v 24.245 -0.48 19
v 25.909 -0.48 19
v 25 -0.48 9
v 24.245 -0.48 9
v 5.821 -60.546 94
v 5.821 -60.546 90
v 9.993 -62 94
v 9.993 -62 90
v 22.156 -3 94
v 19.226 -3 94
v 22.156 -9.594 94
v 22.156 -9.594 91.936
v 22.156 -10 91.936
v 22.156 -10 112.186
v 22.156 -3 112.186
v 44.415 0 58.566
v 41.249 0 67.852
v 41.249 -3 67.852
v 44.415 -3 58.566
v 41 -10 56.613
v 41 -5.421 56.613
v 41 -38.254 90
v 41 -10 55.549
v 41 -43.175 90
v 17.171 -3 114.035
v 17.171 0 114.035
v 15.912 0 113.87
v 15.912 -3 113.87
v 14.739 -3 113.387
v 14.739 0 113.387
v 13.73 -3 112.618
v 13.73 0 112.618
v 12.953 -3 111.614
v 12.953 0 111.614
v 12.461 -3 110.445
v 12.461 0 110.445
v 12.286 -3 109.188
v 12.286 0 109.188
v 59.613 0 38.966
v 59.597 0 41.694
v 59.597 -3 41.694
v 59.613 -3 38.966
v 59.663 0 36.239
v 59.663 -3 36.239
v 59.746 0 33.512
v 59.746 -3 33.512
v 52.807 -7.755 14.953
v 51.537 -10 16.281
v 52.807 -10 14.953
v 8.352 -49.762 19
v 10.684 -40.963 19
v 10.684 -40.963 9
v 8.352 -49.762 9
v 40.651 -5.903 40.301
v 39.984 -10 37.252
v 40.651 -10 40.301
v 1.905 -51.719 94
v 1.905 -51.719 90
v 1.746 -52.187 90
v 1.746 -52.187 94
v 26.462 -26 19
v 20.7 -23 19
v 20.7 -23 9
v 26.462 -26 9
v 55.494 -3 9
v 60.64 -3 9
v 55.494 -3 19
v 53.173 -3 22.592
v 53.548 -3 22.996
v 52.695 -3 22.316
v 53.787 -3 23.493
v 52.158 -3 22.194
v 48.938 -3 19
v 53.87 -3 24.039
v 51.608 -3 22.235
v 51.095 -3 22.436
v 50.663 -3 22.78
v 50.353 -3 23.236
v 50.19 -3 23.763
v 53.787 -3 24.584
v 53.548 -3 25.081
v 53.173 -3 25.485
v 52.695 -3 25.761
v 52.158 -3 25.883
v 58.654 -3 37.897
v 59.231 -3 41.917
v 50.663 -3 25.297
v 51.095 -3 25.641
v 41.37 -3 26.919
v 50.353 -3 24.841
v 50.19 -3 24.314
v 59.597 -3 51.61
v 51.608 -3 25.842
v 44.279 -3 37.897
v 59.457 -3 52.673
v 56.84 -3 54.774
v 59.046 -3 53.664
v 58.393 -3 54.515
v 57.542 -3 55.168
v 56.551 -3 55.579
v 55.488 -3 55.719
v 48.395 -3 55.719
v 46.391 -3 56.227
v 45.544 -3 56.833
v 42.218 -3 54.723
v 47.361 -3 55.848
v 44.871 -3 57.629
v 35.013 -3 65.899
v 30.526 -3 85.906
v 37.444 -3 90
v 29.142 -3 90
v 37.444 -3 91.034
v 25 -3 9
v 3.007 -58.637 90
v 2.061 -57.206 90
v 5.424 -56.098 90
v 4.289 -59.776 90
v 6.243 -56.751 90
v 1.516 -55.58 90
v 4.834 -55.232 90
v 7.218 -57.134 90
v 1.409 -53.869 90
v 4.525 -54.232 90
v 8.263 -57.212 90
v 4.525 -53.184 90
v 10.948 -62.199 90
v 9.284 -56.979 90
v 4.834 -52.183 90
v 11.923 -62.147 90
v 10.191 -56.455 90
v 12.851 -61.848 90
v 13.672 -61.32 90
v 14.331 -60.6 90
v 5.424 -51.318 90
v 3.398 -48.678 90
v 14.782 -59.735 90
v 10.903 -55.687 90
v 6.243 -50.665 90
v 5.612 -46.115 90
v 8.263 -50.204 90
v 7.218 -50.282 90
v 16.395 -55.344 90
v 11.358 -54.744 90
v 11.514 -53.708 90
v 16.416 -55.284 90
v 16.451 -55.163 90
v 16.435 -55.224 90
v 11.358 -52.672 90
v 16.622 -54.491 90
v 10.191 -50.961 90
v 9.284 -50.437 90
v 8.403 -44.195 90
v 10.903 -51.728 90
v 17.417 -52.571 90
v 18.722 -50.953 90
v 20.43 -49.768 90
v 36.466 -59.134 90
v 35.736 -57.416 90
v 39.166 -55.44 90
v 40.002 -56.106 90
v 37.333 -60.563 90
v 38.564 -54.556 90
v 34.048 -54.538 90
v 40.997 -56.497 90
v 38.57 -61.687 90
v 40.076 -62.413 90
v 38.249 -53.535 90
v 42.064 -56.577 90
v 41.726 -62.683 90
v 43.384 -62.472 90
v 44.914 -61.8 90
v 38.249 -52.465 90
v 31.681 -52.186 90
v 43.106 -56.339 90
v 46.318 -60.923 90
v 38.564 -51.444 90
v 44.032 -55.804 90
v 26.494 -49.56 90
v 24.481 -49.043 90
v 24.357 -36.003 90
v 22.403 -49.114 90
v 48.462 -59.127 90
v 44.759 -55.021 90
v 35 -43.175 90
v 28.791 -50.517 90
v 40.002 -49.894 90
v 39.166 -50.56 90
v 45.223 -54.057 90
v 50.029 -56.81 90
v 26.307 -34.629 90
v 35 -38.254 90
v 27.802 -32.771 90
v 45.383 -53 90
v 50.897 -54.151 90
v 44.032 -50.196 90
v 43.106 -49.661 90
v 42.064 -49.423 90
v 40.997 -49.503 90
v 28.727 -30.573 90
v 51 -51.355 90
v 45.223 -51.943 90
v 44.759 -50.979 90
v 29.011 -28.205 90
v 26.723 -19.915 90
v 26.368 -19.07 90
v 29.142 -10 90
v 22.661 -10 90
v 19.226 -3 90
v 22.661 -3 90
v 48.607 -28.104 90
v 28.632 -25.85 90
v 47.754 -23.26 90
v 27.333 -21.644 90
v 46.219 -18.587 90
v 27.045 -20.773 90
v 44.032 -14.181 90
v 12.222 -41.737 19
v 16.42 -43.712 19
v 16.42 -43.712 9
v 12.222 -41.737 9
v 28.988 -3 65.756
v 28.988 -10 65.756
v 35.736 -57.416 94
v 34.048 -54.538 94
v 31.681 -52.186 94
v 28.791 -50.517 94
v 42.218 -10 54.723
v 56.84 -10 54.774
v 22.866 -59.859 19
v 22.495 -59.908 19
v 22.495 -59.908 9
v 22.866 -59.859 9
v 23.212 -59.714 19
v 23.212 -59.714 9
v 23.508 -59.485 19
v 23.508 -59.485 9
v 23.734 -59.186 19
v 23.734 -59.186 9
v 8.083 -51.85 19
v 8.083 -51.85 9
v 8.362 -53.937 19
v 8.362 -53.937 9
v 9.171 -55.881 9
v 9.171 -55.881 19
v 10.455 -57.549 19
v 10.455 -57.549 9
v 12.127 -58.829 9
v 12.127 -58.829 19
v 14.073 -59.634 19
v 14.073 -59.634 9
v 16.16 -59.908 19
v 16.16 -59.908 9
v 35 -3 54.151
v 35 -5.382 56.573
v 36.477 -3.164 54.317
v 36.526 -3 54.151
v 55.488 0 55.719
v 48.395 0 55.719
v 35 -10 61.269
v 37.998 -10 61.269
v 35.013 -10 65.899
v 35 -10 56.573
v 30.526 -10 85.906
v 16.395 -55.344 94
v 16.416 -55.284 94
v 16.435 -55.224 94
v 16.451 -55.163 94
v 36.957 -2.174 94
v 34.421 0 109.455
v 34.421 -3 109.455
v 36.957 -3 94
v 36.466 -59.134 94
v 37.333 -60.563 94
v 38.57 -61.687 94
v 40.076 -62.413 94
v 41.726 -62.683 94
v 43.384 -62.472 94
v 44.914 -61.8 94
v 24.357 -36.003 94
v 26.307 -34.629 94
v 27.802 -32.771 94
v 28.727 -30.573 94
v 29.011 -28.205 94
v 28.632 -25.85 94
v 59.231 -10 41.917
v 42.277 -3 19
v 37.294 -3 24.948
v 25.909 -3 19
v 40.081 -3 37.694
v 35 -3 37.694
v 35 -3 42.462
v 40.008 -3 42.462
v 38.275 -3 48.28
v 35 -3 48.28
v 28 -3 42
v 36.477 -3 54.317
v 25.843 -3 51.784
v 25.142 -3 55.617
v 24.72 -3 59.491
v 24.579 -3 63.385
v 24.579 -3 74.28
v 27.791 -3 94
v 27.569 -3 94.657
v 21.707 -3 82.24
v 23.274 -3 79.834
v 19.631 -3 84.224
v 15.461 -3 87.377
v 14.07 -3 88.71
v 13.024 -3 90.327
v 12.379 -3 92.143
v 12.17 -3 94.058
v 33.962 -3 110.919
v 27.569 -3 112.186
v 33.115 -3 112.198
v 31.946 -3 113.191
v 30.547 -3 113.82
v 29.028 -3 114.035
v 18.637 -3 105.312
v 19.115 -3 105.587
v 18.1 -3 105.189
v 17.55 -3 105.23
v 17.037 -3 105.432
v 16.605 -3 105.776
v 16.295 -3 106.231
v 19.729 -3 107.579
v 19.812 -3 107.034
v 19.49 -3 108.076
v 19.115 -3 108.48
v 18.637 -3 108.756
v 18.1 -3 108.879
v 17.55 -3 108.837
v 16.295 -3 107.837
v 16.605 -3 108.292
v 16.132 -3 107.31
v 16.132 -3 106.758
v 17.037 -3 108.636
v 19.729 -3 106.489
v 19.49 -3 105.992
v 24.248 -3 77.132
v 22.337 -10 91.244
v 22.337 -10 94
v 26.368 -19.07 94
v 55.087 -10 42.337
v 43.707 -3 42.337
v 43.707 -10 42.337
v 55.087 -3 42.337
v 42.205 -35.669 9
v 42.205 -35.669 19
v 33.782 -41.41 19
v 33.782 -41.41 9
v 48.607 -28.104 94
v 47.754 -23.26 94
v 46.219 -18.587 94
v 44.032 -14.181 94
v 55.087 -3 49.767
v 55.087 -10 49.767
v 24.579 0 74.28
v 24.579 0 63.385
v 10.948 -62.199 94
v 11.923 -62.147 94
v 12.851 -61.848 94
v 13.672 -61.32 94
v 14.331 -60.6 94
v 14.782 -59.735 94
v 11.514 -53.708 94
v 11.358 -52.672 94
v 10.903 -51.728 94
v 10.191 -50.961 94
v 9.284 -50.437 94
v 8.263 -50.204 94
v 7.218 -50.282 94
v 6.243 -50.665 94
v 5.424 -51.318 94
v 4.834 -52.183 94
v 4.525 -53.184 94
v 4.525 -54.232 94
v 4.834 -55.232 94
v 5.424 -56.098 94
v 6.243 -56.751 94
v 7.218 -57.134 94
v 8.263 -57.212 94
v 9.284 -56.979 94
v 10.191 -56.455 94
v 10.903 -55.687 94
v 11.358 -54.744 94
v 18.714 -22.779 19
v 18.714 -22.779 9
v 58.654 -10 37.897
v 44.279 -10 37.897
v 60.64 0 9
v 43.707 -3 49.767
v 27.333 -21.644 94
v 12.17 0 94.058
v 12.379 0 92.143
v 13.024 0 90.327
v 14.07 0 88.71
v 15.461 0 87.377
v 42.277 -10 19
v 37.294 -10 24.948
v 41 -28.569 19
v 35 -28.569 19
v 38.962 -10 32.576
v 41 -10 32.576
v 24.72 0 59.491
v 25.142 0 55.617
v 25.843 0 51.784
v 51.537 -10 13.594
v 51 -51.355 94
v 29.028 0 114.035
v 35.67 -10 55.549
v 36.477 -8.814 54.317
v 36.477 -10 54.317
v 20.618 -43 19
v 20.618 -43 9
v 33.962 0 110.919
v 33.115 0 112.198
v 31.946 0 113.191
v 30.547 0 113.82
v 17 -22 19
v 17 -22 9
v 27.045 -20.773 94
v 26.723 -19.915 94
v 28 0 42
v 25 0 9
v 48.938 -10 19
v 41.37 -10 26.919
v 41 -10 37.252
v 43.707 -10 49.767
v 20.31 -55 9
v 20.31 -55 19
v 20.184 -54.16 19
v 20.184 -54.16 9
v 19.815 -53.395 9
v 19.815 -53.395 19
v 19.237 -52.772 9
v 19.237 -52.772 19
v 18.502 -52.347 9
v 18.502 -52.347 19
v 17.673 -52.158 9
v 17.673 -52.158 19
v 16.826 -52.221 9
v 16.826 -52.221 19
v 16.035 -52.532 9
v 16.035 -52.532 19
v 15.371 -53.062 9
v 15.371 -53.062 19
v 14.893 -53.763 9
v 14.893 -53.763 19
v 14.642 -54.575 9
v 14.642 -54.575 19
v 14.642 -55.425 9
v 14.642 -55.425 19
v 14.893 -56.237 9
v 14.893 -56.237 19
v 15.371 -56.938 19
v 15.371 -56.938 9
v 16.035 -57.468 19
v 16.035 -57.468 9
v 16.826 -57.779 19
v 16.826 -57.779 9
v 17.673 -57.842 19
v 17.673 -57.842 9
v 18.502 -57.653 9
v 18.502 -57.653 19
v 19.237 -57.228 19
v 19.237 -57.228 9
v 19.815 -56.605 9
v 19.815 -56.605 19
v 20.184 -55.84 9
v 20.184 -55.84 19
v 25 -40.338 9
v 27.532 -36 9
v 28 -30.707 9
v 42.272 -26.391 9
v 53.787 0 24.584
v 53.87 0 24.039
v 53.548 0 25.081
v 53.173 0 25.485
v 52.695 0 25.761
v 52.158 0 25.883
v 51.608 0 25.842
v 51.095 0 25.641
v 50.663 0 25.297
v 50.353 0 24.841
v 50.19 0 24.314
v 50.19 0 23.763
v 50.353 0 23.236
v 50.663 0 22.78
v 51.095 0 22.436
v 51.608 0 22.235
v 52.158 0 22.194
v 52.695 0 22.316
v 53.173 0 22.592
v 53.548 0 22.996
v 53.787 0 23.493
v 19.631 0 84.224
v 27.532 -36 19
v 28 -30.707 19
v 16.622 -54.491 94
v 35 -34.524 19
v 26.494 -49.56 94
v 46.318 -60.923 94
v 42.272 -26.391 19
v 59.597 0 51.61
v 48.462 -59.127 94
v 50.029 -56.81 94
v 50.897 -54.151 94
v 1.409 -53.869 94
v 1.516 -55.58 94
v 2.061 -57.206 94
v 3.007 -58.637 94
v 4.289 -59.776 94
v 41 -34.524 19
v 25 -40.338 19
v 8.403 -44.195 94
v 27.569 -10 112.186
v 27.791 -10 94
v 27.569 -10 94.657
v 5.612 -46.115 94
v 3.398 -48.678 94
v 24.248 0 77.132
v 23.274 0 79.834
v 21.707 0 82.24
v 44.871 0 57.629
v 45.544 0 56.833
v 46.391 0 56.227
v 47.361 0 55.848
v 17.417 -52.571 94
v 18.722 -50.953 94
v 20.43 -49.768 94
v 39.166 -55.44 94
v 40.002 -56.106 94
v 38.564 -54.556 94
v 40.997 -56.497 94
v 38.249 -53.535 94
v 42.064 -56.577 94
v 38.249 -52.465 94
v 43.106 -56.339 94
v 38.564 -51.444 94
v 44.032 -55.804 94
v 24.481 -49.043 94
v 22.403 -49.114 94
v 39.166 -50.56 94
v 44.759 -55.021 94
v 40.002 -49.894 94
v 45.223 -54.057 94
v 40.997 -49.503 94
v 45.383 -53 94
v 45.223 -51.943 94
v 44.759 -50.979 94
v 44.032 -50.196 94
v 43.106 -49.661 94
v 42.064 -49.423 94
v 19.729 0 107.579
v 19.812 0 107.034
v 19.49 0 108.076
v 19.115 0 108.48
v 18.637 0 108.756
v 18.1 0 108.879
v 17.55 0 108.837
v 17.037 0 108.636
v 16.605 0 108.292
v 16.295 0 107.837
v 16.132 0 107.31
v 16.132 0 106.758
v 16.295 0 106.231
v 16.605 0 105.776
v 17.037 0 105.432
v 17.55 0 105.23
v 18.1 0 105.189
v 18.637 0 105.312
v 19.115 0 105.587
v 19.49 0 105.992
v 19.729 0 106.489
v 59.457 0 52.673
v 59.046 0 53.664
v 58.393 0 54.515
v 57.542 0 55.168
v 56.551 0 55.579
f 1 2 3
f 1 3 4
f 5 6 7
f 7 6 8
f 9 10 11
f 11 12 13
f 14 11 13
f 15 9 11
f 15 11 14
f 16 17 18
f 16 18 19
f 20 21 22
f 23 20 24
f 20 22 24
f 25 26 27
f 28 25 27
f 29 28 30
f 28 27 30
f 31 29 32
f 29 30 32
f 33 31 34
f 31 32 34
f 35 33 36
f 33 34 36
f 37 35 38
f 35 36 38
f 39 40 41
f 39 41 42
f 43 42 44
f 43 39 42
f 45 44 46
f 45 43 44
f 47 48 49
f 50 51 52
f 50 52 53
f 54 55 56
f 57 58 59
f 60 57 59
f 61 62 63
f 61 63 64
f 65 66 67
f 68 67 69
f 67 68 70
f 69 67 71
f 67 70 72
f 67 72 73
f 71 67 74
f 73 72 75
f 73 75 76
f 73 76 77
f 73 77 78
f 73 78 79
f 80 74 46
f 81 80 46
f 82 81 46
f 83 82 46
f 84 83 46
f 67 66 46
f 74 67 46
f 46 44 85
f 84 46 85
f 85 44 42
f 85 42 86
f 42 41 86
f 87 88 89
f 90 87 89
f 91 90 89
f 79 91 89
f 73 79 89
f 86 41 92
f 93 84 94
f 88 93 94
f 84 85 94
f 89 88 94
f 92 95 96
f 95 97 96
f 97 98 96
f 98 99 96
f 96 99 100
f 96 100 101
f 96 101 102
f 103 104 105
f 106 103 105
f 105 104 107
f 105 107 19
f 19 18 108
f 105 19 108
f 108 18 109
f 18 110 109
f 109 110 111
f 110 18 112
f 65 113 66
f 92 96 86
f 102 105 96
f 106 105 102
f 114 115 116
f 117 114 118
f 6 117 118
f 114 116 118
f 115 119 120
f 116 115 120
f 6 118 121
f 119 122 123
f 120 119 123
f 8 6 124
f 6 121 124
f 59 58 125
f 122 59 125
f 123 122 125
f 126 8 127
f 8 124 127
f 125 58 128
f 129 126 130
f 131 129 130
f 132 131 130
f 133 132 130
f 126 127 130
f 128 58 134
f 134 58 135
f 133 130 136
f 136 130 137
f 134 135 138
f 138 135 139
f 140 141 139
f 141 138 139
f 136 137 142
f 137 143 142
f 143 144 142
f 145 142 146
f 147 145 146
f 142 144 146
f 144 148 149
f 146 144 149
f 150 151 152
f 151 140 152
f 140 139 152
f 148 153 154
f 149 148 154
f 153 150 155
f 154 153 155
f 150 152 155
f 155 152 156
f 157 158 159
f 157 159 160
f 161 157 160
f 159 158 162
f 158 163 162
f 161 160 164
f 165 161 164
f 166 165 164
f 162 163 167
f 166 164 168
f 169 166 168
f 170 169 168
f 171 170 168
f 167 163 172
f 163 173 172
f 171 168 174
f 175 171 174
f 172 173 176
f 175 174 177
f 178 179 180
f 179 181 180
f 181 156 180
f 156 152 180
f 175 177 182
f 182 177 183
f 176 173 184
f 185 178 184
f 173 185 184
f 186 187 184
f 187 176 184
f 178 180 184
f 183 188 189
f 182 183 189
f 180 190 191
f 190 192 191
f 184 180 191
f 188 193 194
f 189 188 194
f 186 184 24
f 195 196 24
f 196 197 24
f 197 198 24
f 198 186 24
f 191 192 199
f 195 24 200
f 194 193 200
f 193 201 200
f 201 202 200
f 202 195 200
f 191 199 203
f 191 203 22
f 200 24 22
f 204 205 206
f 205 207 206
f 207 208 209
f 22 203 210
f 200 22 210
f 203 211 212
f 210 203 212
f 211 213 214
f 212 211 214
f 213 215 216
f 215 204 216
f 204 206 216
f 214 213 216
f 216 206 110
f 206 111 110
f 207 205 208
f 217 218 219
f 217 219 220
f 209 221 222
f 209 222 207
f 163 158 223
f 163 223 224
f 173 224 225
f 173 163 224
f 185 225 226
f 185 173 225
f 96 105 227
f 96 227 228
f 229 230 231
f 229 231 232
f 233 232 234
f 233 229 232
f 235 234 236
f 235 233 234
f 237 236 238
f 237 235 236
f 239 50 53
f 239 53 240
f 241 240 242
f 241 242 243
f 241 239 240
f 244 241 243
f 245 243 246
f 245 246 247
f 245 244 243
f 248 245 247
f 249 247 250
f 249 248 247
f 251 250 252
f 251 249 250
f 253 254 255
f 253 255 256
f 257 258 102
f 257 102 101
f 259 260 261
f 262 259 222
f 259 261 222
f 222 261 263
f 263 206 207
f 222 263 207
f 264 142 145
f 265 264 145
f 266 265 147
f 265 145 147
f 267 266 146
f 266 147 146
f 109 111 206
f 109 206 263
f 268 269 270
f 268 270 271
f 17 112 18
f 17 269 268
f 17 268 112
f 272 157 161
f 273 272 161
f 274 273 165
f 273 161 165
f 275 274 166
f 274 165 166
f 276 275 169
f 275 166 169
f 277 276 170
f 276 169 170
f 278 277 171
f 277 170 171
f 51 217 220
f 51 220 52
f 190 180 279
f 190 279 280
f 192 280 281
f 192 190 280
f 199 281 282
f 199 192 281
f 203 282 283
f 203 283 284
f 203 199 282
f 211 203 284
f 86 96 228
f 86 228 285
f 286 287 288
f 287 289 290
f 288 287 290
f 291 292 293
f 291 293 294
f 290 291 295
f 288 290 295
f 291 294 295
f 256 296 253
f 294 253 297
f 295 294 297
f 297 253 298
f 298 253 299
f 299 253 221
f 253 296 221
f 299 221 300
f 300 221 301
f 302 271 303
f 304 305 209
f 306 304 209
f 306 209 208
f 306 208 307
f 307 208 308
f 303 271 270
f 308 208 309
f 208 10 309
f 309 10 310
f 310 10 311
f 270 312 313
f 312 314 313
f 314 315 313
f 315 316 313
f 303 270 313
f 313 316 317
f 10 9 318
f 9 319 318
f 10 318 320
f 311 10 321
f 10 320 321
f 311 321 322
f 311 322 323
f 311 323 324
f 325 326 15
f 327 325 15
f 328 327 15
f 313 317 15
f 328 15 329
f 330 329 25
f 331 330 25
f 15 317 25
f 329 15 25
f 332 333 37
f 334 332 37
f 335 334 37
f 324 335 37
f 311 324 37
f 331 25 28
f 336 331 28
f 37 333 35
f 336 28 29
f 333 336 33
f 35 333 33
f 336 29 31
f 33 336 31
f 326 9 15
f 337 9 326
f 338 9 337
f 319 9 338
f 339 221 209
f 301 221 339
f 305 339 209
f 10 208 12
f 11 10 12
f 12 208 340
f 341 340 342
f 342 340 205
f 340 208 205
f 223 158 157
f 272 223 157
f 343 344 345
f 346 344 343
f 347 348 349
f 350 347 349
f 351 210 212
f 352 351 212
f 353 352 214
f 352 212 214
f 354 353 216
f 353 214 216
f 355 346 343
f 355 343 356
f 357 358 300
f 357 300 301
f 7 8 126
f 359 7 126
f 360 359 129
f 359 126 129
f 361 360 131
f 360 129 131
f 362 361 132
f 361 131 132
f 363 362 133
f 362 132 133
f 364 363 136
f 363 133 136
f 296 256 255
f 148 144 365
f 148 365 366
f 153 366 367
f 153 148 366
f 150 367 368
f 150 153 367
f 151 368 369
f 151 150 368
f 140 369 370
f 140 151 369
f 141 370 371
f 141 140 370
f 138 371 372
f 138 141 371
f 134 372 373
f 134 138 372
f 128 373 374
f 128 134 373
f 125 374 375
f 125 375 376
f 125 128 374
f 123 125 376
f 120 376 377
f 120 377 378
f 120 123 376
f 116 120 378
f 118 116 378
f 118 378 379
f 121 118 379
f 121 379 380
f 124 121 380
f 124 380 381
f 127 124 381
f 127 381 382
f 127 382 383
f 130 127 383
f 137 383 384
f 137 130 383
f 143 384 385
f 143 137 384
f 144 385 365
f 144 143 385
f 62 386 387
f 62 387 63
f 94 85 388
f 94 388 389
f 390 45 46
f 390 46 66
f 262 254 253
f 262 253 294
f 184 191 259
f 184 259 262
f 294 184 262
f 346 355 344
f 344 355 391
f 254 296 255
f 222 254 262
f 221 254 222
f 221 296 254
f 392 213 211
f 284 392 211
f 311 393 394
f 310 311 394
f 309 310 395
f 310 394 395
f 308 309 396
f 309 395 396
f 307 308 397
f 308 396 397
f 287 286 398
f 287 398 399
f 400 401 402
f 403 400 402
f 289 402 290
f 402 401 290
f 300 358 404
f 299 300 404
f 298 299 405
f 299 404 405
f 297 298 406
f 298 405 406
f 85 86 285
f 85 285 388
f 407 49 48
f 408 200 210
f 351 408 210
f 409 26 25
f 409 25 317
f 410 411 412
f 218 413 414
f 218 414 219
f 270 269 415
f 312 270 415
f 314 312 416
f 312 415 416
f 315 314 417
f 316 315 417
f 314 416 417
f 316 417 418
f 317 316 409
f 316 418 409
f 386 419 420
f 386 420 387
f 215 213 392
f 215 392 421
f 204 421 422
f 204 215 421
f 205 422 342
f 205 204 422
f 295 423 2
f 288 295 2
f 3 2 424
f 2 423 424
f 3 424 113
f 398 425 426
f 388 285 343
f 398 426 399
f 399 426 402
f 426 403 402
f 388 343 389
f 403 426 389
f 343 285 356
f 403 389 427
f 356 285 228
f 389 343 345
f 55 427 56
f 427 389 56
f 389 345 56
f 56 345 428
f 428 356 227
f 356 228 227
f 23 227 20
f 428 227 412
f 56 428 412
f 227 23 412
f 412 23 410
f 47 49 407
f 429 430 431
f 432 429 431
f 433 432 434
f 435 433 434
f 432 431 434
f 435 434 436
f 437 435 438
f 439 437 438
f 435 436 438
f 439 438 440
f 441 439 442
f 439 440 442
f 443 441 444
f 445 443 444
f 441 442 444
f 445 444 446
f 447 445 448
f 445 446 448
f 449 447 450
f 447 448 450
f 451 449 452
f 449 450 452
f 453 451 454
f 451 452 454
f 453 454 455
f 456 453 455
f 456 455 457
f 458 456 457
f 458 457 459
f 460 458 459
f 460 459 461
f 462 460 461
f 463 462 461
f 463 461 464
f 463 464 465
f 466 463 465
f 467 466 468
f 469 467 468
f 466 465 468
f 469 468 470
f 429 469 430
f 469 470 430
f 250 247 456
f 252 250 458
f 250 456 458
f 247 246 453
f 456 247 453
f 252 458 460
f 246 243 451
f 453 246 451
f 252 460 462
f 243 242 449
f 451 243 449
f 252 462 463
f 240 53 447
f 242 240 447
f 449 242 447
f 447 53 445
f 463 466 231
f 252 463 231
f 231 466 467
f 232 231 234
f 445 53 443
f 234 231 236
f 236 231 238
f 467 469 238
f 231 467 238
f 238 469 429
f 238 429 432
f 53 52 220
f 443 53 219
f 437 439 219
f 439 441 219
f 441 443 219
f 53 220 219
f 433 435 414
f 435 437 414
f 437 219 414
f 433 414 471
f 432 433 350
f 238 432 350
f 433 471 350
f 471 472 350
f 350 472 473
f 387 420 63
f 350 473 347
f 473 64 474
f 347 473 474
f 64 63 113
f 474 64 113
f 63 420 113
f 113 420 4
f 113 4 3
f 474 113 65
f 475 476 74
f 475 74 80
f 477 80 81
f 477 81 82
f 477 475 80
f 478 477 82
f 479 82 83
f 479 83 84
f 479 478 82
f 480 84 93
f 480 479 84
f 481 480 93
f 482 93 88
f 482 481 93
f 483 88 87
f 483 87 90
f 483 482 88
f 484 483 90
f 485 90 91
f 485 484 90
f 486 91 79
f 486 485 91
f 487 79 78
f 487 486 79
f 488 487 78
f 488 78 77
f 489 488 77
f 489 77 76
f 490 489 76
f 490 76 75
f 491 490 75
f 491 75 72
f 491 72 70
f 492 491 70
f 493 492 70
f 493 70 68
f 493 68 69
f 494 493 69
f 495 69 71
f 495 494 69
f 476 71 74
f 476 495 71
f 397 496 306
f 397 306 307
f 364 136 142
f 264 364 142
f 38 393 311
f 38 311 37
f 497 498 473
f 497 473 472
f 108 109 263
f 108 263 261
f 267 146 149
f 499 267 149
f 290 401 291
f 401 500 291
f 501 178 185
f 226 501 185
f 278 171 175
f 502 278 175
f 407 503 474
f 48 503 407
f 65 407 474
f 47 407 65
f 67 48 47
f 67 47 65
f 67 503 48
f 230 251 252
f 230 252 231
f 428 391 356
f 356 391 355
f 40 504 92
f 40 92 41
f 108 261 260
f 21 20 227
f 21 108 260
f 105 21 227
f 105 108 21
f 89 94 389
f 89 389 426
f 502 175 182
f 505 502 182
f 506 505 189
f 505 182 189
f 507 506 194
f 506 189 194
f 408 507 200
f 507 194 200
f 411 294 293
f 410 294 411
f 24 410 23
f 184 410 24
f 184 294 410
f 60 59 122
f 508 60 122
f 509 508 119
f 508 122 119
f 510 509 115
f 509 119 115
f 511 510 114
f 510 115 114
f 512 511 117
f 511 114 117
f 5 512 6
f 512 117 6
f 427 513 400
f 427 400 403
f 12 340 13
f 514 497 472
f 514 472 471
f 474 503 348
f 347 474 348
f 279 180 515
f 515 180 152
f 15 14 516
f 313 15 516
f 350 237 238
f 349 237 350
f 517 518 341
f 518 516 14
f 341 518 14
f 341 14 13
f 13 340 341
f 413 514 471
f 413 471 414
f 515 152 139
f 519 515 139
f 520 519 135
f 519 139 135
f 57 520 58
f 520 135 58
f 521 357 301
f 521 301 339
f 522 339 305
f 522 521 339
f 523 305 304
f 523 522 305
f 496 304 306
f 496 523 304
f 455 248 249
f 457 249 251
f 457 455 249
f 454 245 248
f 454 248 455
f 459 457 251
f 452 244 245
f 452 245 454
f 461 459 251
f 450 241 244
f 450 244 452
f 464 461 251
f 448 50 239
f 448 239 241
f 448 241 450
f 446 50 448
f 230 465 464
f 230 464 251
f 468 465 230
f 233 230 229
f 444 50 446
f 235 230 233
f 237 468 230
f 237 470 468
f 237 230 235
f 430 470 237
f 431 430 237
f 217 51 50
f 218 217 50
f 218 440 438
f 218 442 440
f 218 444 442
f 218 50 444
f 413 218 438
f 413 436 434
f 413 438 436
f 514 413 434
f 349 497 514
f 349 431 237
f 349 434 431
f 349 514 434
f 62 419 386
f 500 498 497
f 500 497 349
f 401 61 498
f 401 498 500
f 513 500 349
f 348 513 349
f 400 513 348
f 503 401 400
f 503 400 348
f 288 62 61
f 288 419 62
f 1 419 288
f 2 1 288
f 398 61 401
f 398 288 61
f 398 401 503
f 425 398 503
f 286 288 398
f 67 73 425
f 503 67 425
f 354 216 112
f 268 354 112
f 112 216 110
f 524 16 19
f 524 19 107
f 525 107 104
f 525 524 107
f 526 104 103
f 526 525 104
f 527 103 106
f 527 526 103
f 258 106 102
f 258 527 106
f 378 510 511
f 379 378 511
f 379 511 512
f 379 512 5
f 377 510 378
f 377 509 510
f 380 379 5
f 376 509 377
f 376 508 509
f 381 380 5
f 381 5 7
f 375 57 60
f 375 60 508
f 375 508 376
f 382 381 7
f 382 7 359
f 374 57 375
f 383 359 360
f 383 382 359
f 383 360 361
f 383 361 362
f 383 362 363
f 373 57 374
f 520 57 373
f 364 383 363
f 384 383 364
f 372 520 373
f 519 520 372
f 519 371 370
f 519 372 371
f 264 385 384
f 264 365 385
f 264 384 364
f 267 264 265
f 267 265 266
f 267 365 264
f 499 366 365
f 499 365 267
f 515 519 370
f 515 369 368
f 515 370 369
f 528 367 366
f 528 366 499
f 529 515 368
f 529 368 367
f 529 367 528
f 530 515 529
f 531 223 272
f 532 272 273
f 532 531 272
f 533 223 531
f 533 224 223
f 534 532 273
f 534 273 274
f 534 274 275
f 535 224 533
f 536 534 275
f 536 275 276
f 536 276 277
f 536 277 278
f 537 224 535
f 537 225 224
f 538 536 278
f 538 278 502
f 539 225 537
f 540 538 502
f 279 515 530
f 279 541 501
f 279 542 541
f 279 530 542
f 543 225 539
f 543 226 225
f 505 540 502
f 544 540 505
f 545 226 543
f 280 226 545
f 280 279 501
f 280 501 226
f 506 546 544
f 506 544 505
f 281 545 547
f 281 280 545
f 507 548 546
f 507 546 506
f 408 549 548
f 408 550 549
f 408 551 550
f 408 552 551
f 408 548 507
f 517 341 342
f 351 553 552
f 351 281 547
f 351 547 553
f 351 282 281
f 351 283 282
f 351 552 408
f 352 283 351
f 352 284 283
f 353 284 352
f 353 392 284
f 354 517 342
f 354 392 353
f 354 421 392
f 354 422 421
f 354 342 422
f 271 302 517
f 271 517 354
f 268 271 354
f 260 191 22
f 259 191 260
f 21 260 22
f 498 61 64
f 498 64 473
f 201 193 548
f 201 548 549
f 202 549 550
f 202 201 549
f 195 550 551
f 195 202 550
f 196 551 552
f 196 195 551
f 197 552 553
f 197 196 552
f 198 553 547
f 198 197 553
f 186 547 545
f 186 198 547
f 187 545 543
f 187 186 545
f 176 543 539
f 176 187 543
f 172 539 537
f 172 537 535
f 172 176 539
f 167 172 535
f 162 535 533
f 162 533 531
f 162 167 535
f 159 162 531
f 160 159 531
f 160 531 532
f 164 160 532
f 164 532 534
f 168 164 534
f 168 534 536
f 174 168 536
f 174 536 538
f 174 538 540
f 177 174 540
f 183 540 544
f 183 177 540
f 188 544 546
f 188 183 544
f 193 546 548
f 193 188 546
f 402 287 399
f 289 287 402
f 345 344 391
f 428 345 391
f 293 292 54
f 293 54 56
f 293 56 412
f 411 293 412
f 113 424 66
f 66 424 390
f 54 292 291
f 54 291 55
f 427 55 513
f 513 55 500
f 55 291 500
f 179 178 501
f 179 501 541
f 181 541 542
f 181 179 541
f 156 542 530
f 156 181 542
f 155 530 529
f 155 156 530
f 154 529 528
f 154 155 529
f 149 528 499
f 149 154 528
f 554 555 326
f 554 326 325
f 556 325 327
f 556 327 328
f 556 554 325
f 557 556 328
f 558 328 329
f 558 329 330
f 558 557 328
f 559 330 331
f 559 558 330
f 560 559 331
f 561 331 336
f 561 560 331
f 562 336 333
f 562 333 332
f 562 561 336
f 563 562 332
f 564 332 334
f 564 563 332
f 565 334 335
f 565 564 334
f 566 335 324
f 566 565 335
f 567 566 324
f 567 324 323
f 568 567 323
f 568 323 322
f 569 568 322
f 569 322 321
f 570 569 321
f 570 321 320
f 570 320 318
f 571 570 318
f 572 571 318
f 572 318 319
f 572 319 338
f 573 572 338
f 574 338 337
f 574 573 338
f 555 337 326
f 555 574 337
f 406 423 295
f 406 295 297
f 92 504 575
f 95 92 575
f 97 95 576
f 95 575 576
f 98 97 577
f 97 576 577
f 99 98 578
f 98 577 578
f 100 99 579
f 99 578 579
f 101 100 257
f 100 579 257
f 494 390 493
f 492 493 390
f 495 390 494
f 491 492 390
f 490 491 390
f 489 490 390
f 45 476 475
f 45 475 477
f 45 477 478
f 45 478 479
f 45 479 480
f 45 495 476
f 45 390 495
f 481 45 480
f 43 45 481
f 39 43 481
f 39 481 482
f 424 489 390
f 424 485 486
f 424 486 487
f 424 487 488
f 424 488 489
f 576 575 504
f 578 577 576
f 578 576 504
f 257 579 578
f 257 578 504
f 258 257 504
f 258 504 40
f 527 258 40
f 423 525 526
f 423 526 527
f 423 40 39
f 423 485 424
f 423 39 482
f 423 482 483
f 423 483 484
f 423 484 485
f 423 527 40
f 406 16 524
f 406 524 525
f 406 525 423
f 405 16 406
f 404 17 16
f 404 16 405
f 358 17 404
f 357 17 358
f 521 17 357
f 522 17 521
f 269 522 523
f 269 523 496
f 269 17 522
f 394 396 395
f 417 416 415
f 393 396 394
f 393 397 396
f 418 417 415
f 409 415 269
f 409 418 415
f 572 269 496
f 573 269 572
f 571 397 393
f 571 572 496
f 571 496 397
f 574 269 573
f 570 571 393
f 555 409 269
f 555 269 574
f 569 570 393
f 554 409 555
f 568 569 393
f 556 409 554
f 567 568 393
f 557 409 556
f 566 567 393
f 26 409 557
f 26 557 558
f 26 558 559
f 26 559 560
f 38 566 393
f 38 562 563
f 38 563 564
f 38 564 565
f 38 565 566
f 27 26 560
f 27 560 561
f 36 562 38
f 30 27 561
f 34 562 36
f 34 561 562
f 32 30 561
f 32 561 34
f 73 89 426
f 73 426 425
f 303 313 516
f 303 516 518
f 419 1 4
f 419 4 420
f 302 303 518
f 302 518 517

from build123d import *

# Parameters (mm, degrees)
SKETCH_R      = 1.85
PAD_DEPTH     = 3
SKETCH812_R   = 2.85
PAD348_DEPTH  = 10
SKETCH813_R   = 3.513871
SKETCH813_R_2 = 3.587043
PAD349_DEPTH  = 4
SKETCH821_W   = 11.37968
SKETCH821_H   = 7.430097
PAD355_DEPTH  = 10
PAD363_DEPTH  = 6


with BuildPart() as part:
    # Sketch → Pad (new body)
    with BuildSketch(Plane.XZ):
        with BuildLine():
            Line((17.170527, 114.035013), (29.028223, 114.035013))
            ThreePointArc((34.420691, 109.455462), (32.565559, 112.735644), (29.028223, 114.035013))
            Line((34.420691, 109.455462), (41.249141, 67.851686))
            Line((41.249141, 67.851686), (44.41543, 58.566272))
            ThreePointArc((44.41543, 58.566272), (45.948377, 56.503803), (48.395228, 55.718549))
            Line((48.395228, 55.718549), (55.488024, 55.718549))
            ThreePointArc((59.596813, 51.60976), (58.393377, 54.515112), (55.488024, 55.718549))
            Line((59.596813, 51.60976), (59.596813, 41.694012))
            ThreePointArc((59.596813, 41.694012), (59.634099, 37.602359), (59.745945, 33.512064))
            Line((59.745945, 33.512064), (60.639802, 8.999999))
            Line((25, 8.999999), (60.639802, 8.999999))
            Line((28, 42), (25, 8.999999))
            Line((28, 42), (25.842674, 51.783651))
            ThreePointArc((24.578785, 63.385024), (24.89569, 57.550016), (25.842674, 51.783651))
            Line((24.578785, 63.385024), (24.578785, 74.280037))
            ThreePointArc((24.578785, 74.280037), (23.273536, 79.833608), (19.63109, 84.224328))
            Line((19.63109, 84.224328), (15.461415, 87.377315))
            ThreePointArc((12.16968, 94.057692), (13.023718, 90.327332), (15.461415, 87.377315))
            Line((12.16968, 94.057692), (12.286198, 109.188152))
            ThreePointArc((17.170527, 114.035013), (13.730006, 112.617656), (12.286198, 109.188152))
        make_face()
        with Locations((17.961559, 107.033859)):
            Circle(SKETCH_R, mode=Mode.SUBTRACT)
        with Locations((52.019562, 24.038517)):
            Circle(SKETCH_R, mode=Mode.SUBTRACT)
    extrude(amount=PAD_DEPTH)

    # Sketch812 → Pad348 (join)
    with BuildSketch(Plane.XY.offset(19)):
        with BuildLine():
            Line((35.385866, -0.616313), (31, -0.47951))
            Line((31, -0.47951), (24.245244, -0.47951))
            Line((24.245244, -0.47951), (17, -22))
            Line((17, -22), (18.714132, -22.779449))
            Line((18.714132, -22.779449), (20.699953, -23))
            Line((20.699953, -23), (26.461662, -26))
            Line((26.461662, -26), (28, -30.707495))
            Line((28, -30.707495), (27.531696, -36))
            Line((27.531696, -36), (25, -40.33778))
            Line((25, -40.33778), (20.617645, -43))
            Line((20.617645, -43), (16.419827, -43.712494))
            Line((16.419827, -43.712494), (12.22201, -41.737053))
            Line((12.22201, -41.737053), (10.684048, -40.962522))
            Line((10.684048, -40.962522), (8.352329, -49.76217))
            ThreePointArc((8.352329, -49.76217), (9.758834, -56.757072), (16.160124, -59.908323))
            Line((16.160124, -59.908323), (22.494802, -59.908323))
            ThreePointArc((22.494802, -59.908323), (23.211929, -59.71442), (23.733626, -59.185552))
            Line((23.733626, -59.185552), (33.781615, -41.410286))
            Line((42.205357, -35.669304), (33.781615, -41.410286))
            Line((42.271875, -26.390701), (42.205357, -35.669304))
            Line((42.271875, -26.390701), (56.841603, -0.616313))
            Line((56.841603, -0.616313), (35.385866, -0.616313))
        make_face()
        with Locations((17.460455, -55)):
            Circle(SKETCH812_R, mode=Mode.SUBTRACT)
    extrude(amount=-PAD348_DEPTH)

    # Sketch813 → Pad349 (join)
    with BuildSketch(Plane.XY.offset(90)):
        with BuildLine():
            Line((18.169887, -0.624235), (26.367772, -19.070229))
            ThreePointArc((27.333045, -21.643874), (26.888629, -20.342717), (26.367772, -19.070229))
            Line((27.333045, -21.643874), (28.631721, -25.850496))
            ThreePointArc((24.357214, -36.0031), (28.341536, -31.704461), (28.631721, -25.850496))
            Line((24.357214, -36.0031), (8.402813, -44.195061))
            ThreePointArc((8.402813, -44.195061), (4.422376, -47.325464), (1.905131, -51.719412))
            Line((1.905131, -51.719412), (1.74589, -52.187085))
            ThreePointArc((1.74589, -52.187085), (2.061173, -57.206378), (5.821391, -60.54606))
            Line((5.821391, -60.54606), (9.993196, -61.999858))
            ThreePointArc((9.993196, -61.999858), (12.851411, -61.847603), (14.782453, -59.734867))
            Line((14.782453, -59.734867), (16.394974, -55.344035))
            ThreePointArc((16.394974, -55.344035), (16.425444, -55.254007), (16.451264, -55.162537))
            Line((16.451264, -55.162537), (16.622268, -54.491485))
            ThreePointArc((26.49366, -49.560226), (20.430172, -49.768242), (16.622268, -54.491485))
            Line((26.49366, -49.560226), (28.791165, -50.517281))
            ThreePointArc((35.736479, -57.415769), (32.940269, -53.285486), (28.791165, -50.517281))
            Line((35.736479, -57.415769), (36.465842, -59.133842))
            ThreePointArc((36.465842, -59.133842), (40.075749, -62.413453), (44.914196, -61.799683))
            Line((44.914196, -61.799683), (46.318309, -60.923252))
            ThreePointArc((46.318309, -60.923252), (50.028994, -56.809581), (51.000403, -51.355423))
            Line((51.000403, -51.355423), (48.606712, -28.103775))
            ThreePointArc((48.606712, -28.103775), (47.070039, -20.895597), (44.031508, -14.180947))
            Line((44.031508, -14.180947), (36.044554, -0.624235))
            Line((36.044554, -0.624235), (18.169887, -0.624235))
        make_face()
        with Locations((8, -53.707806)):
            Circle(SKETCH813_R, mode=Mode.SUBTRACT)
        with Locations((41.795517, -53)):
            Circle(SKETCH813_R_2, mode=Mode.SUBTRACT)
    extrude(amount=PAD349_DEPTH)

    # Sketch821 → Pad355 (join)
    with BuildSketch(Plane.XZ):
        Polygon((22.156289, 112.186128), (27.568653, 112.186128), (27.568653, 94.657045), (30.525631, 85.906328), (35.012636, 65.899044), (42.218135, 54.723457), (56.839641, 54.774327), (59.23116, 41.91714), (58.653773, 37.89675), (44.278898, 37.89675), (41.369676, 26.918821), (52.806533, 14.952882), (49.043392, 10.924277), (37.294467, 24.947567), (40.651068, 40.30126), (36.476615, 54.317373), (28.98766, 65.755908), (22.156289, 91.93571), align=None)
        with Locations((49.397274, 46.051621)):
            Rectangle(SKETCH821_W, SKETCH821_H, mode=Mode.SUBTRACT)
    extrude(amount=PAD355_DEPTH)

    # Sketch840 → Pad363 (join)
    with BuildSketch(Plane.YZ.offset(35)):
        Polygon((-43.607986, 90.449928), (-38.696293, 90.449928), (-2.349776, 53.489452), (-2.104192, 47.349838), align=None)
        Polygon((-36.262971, 17.706057), (-30.339335, 17.706057), (-1.605939, 38.713028), (-2.09711, 43.133553), align=None)
    extrude(amount=PAD363_DEPTH)


solid = part.part
